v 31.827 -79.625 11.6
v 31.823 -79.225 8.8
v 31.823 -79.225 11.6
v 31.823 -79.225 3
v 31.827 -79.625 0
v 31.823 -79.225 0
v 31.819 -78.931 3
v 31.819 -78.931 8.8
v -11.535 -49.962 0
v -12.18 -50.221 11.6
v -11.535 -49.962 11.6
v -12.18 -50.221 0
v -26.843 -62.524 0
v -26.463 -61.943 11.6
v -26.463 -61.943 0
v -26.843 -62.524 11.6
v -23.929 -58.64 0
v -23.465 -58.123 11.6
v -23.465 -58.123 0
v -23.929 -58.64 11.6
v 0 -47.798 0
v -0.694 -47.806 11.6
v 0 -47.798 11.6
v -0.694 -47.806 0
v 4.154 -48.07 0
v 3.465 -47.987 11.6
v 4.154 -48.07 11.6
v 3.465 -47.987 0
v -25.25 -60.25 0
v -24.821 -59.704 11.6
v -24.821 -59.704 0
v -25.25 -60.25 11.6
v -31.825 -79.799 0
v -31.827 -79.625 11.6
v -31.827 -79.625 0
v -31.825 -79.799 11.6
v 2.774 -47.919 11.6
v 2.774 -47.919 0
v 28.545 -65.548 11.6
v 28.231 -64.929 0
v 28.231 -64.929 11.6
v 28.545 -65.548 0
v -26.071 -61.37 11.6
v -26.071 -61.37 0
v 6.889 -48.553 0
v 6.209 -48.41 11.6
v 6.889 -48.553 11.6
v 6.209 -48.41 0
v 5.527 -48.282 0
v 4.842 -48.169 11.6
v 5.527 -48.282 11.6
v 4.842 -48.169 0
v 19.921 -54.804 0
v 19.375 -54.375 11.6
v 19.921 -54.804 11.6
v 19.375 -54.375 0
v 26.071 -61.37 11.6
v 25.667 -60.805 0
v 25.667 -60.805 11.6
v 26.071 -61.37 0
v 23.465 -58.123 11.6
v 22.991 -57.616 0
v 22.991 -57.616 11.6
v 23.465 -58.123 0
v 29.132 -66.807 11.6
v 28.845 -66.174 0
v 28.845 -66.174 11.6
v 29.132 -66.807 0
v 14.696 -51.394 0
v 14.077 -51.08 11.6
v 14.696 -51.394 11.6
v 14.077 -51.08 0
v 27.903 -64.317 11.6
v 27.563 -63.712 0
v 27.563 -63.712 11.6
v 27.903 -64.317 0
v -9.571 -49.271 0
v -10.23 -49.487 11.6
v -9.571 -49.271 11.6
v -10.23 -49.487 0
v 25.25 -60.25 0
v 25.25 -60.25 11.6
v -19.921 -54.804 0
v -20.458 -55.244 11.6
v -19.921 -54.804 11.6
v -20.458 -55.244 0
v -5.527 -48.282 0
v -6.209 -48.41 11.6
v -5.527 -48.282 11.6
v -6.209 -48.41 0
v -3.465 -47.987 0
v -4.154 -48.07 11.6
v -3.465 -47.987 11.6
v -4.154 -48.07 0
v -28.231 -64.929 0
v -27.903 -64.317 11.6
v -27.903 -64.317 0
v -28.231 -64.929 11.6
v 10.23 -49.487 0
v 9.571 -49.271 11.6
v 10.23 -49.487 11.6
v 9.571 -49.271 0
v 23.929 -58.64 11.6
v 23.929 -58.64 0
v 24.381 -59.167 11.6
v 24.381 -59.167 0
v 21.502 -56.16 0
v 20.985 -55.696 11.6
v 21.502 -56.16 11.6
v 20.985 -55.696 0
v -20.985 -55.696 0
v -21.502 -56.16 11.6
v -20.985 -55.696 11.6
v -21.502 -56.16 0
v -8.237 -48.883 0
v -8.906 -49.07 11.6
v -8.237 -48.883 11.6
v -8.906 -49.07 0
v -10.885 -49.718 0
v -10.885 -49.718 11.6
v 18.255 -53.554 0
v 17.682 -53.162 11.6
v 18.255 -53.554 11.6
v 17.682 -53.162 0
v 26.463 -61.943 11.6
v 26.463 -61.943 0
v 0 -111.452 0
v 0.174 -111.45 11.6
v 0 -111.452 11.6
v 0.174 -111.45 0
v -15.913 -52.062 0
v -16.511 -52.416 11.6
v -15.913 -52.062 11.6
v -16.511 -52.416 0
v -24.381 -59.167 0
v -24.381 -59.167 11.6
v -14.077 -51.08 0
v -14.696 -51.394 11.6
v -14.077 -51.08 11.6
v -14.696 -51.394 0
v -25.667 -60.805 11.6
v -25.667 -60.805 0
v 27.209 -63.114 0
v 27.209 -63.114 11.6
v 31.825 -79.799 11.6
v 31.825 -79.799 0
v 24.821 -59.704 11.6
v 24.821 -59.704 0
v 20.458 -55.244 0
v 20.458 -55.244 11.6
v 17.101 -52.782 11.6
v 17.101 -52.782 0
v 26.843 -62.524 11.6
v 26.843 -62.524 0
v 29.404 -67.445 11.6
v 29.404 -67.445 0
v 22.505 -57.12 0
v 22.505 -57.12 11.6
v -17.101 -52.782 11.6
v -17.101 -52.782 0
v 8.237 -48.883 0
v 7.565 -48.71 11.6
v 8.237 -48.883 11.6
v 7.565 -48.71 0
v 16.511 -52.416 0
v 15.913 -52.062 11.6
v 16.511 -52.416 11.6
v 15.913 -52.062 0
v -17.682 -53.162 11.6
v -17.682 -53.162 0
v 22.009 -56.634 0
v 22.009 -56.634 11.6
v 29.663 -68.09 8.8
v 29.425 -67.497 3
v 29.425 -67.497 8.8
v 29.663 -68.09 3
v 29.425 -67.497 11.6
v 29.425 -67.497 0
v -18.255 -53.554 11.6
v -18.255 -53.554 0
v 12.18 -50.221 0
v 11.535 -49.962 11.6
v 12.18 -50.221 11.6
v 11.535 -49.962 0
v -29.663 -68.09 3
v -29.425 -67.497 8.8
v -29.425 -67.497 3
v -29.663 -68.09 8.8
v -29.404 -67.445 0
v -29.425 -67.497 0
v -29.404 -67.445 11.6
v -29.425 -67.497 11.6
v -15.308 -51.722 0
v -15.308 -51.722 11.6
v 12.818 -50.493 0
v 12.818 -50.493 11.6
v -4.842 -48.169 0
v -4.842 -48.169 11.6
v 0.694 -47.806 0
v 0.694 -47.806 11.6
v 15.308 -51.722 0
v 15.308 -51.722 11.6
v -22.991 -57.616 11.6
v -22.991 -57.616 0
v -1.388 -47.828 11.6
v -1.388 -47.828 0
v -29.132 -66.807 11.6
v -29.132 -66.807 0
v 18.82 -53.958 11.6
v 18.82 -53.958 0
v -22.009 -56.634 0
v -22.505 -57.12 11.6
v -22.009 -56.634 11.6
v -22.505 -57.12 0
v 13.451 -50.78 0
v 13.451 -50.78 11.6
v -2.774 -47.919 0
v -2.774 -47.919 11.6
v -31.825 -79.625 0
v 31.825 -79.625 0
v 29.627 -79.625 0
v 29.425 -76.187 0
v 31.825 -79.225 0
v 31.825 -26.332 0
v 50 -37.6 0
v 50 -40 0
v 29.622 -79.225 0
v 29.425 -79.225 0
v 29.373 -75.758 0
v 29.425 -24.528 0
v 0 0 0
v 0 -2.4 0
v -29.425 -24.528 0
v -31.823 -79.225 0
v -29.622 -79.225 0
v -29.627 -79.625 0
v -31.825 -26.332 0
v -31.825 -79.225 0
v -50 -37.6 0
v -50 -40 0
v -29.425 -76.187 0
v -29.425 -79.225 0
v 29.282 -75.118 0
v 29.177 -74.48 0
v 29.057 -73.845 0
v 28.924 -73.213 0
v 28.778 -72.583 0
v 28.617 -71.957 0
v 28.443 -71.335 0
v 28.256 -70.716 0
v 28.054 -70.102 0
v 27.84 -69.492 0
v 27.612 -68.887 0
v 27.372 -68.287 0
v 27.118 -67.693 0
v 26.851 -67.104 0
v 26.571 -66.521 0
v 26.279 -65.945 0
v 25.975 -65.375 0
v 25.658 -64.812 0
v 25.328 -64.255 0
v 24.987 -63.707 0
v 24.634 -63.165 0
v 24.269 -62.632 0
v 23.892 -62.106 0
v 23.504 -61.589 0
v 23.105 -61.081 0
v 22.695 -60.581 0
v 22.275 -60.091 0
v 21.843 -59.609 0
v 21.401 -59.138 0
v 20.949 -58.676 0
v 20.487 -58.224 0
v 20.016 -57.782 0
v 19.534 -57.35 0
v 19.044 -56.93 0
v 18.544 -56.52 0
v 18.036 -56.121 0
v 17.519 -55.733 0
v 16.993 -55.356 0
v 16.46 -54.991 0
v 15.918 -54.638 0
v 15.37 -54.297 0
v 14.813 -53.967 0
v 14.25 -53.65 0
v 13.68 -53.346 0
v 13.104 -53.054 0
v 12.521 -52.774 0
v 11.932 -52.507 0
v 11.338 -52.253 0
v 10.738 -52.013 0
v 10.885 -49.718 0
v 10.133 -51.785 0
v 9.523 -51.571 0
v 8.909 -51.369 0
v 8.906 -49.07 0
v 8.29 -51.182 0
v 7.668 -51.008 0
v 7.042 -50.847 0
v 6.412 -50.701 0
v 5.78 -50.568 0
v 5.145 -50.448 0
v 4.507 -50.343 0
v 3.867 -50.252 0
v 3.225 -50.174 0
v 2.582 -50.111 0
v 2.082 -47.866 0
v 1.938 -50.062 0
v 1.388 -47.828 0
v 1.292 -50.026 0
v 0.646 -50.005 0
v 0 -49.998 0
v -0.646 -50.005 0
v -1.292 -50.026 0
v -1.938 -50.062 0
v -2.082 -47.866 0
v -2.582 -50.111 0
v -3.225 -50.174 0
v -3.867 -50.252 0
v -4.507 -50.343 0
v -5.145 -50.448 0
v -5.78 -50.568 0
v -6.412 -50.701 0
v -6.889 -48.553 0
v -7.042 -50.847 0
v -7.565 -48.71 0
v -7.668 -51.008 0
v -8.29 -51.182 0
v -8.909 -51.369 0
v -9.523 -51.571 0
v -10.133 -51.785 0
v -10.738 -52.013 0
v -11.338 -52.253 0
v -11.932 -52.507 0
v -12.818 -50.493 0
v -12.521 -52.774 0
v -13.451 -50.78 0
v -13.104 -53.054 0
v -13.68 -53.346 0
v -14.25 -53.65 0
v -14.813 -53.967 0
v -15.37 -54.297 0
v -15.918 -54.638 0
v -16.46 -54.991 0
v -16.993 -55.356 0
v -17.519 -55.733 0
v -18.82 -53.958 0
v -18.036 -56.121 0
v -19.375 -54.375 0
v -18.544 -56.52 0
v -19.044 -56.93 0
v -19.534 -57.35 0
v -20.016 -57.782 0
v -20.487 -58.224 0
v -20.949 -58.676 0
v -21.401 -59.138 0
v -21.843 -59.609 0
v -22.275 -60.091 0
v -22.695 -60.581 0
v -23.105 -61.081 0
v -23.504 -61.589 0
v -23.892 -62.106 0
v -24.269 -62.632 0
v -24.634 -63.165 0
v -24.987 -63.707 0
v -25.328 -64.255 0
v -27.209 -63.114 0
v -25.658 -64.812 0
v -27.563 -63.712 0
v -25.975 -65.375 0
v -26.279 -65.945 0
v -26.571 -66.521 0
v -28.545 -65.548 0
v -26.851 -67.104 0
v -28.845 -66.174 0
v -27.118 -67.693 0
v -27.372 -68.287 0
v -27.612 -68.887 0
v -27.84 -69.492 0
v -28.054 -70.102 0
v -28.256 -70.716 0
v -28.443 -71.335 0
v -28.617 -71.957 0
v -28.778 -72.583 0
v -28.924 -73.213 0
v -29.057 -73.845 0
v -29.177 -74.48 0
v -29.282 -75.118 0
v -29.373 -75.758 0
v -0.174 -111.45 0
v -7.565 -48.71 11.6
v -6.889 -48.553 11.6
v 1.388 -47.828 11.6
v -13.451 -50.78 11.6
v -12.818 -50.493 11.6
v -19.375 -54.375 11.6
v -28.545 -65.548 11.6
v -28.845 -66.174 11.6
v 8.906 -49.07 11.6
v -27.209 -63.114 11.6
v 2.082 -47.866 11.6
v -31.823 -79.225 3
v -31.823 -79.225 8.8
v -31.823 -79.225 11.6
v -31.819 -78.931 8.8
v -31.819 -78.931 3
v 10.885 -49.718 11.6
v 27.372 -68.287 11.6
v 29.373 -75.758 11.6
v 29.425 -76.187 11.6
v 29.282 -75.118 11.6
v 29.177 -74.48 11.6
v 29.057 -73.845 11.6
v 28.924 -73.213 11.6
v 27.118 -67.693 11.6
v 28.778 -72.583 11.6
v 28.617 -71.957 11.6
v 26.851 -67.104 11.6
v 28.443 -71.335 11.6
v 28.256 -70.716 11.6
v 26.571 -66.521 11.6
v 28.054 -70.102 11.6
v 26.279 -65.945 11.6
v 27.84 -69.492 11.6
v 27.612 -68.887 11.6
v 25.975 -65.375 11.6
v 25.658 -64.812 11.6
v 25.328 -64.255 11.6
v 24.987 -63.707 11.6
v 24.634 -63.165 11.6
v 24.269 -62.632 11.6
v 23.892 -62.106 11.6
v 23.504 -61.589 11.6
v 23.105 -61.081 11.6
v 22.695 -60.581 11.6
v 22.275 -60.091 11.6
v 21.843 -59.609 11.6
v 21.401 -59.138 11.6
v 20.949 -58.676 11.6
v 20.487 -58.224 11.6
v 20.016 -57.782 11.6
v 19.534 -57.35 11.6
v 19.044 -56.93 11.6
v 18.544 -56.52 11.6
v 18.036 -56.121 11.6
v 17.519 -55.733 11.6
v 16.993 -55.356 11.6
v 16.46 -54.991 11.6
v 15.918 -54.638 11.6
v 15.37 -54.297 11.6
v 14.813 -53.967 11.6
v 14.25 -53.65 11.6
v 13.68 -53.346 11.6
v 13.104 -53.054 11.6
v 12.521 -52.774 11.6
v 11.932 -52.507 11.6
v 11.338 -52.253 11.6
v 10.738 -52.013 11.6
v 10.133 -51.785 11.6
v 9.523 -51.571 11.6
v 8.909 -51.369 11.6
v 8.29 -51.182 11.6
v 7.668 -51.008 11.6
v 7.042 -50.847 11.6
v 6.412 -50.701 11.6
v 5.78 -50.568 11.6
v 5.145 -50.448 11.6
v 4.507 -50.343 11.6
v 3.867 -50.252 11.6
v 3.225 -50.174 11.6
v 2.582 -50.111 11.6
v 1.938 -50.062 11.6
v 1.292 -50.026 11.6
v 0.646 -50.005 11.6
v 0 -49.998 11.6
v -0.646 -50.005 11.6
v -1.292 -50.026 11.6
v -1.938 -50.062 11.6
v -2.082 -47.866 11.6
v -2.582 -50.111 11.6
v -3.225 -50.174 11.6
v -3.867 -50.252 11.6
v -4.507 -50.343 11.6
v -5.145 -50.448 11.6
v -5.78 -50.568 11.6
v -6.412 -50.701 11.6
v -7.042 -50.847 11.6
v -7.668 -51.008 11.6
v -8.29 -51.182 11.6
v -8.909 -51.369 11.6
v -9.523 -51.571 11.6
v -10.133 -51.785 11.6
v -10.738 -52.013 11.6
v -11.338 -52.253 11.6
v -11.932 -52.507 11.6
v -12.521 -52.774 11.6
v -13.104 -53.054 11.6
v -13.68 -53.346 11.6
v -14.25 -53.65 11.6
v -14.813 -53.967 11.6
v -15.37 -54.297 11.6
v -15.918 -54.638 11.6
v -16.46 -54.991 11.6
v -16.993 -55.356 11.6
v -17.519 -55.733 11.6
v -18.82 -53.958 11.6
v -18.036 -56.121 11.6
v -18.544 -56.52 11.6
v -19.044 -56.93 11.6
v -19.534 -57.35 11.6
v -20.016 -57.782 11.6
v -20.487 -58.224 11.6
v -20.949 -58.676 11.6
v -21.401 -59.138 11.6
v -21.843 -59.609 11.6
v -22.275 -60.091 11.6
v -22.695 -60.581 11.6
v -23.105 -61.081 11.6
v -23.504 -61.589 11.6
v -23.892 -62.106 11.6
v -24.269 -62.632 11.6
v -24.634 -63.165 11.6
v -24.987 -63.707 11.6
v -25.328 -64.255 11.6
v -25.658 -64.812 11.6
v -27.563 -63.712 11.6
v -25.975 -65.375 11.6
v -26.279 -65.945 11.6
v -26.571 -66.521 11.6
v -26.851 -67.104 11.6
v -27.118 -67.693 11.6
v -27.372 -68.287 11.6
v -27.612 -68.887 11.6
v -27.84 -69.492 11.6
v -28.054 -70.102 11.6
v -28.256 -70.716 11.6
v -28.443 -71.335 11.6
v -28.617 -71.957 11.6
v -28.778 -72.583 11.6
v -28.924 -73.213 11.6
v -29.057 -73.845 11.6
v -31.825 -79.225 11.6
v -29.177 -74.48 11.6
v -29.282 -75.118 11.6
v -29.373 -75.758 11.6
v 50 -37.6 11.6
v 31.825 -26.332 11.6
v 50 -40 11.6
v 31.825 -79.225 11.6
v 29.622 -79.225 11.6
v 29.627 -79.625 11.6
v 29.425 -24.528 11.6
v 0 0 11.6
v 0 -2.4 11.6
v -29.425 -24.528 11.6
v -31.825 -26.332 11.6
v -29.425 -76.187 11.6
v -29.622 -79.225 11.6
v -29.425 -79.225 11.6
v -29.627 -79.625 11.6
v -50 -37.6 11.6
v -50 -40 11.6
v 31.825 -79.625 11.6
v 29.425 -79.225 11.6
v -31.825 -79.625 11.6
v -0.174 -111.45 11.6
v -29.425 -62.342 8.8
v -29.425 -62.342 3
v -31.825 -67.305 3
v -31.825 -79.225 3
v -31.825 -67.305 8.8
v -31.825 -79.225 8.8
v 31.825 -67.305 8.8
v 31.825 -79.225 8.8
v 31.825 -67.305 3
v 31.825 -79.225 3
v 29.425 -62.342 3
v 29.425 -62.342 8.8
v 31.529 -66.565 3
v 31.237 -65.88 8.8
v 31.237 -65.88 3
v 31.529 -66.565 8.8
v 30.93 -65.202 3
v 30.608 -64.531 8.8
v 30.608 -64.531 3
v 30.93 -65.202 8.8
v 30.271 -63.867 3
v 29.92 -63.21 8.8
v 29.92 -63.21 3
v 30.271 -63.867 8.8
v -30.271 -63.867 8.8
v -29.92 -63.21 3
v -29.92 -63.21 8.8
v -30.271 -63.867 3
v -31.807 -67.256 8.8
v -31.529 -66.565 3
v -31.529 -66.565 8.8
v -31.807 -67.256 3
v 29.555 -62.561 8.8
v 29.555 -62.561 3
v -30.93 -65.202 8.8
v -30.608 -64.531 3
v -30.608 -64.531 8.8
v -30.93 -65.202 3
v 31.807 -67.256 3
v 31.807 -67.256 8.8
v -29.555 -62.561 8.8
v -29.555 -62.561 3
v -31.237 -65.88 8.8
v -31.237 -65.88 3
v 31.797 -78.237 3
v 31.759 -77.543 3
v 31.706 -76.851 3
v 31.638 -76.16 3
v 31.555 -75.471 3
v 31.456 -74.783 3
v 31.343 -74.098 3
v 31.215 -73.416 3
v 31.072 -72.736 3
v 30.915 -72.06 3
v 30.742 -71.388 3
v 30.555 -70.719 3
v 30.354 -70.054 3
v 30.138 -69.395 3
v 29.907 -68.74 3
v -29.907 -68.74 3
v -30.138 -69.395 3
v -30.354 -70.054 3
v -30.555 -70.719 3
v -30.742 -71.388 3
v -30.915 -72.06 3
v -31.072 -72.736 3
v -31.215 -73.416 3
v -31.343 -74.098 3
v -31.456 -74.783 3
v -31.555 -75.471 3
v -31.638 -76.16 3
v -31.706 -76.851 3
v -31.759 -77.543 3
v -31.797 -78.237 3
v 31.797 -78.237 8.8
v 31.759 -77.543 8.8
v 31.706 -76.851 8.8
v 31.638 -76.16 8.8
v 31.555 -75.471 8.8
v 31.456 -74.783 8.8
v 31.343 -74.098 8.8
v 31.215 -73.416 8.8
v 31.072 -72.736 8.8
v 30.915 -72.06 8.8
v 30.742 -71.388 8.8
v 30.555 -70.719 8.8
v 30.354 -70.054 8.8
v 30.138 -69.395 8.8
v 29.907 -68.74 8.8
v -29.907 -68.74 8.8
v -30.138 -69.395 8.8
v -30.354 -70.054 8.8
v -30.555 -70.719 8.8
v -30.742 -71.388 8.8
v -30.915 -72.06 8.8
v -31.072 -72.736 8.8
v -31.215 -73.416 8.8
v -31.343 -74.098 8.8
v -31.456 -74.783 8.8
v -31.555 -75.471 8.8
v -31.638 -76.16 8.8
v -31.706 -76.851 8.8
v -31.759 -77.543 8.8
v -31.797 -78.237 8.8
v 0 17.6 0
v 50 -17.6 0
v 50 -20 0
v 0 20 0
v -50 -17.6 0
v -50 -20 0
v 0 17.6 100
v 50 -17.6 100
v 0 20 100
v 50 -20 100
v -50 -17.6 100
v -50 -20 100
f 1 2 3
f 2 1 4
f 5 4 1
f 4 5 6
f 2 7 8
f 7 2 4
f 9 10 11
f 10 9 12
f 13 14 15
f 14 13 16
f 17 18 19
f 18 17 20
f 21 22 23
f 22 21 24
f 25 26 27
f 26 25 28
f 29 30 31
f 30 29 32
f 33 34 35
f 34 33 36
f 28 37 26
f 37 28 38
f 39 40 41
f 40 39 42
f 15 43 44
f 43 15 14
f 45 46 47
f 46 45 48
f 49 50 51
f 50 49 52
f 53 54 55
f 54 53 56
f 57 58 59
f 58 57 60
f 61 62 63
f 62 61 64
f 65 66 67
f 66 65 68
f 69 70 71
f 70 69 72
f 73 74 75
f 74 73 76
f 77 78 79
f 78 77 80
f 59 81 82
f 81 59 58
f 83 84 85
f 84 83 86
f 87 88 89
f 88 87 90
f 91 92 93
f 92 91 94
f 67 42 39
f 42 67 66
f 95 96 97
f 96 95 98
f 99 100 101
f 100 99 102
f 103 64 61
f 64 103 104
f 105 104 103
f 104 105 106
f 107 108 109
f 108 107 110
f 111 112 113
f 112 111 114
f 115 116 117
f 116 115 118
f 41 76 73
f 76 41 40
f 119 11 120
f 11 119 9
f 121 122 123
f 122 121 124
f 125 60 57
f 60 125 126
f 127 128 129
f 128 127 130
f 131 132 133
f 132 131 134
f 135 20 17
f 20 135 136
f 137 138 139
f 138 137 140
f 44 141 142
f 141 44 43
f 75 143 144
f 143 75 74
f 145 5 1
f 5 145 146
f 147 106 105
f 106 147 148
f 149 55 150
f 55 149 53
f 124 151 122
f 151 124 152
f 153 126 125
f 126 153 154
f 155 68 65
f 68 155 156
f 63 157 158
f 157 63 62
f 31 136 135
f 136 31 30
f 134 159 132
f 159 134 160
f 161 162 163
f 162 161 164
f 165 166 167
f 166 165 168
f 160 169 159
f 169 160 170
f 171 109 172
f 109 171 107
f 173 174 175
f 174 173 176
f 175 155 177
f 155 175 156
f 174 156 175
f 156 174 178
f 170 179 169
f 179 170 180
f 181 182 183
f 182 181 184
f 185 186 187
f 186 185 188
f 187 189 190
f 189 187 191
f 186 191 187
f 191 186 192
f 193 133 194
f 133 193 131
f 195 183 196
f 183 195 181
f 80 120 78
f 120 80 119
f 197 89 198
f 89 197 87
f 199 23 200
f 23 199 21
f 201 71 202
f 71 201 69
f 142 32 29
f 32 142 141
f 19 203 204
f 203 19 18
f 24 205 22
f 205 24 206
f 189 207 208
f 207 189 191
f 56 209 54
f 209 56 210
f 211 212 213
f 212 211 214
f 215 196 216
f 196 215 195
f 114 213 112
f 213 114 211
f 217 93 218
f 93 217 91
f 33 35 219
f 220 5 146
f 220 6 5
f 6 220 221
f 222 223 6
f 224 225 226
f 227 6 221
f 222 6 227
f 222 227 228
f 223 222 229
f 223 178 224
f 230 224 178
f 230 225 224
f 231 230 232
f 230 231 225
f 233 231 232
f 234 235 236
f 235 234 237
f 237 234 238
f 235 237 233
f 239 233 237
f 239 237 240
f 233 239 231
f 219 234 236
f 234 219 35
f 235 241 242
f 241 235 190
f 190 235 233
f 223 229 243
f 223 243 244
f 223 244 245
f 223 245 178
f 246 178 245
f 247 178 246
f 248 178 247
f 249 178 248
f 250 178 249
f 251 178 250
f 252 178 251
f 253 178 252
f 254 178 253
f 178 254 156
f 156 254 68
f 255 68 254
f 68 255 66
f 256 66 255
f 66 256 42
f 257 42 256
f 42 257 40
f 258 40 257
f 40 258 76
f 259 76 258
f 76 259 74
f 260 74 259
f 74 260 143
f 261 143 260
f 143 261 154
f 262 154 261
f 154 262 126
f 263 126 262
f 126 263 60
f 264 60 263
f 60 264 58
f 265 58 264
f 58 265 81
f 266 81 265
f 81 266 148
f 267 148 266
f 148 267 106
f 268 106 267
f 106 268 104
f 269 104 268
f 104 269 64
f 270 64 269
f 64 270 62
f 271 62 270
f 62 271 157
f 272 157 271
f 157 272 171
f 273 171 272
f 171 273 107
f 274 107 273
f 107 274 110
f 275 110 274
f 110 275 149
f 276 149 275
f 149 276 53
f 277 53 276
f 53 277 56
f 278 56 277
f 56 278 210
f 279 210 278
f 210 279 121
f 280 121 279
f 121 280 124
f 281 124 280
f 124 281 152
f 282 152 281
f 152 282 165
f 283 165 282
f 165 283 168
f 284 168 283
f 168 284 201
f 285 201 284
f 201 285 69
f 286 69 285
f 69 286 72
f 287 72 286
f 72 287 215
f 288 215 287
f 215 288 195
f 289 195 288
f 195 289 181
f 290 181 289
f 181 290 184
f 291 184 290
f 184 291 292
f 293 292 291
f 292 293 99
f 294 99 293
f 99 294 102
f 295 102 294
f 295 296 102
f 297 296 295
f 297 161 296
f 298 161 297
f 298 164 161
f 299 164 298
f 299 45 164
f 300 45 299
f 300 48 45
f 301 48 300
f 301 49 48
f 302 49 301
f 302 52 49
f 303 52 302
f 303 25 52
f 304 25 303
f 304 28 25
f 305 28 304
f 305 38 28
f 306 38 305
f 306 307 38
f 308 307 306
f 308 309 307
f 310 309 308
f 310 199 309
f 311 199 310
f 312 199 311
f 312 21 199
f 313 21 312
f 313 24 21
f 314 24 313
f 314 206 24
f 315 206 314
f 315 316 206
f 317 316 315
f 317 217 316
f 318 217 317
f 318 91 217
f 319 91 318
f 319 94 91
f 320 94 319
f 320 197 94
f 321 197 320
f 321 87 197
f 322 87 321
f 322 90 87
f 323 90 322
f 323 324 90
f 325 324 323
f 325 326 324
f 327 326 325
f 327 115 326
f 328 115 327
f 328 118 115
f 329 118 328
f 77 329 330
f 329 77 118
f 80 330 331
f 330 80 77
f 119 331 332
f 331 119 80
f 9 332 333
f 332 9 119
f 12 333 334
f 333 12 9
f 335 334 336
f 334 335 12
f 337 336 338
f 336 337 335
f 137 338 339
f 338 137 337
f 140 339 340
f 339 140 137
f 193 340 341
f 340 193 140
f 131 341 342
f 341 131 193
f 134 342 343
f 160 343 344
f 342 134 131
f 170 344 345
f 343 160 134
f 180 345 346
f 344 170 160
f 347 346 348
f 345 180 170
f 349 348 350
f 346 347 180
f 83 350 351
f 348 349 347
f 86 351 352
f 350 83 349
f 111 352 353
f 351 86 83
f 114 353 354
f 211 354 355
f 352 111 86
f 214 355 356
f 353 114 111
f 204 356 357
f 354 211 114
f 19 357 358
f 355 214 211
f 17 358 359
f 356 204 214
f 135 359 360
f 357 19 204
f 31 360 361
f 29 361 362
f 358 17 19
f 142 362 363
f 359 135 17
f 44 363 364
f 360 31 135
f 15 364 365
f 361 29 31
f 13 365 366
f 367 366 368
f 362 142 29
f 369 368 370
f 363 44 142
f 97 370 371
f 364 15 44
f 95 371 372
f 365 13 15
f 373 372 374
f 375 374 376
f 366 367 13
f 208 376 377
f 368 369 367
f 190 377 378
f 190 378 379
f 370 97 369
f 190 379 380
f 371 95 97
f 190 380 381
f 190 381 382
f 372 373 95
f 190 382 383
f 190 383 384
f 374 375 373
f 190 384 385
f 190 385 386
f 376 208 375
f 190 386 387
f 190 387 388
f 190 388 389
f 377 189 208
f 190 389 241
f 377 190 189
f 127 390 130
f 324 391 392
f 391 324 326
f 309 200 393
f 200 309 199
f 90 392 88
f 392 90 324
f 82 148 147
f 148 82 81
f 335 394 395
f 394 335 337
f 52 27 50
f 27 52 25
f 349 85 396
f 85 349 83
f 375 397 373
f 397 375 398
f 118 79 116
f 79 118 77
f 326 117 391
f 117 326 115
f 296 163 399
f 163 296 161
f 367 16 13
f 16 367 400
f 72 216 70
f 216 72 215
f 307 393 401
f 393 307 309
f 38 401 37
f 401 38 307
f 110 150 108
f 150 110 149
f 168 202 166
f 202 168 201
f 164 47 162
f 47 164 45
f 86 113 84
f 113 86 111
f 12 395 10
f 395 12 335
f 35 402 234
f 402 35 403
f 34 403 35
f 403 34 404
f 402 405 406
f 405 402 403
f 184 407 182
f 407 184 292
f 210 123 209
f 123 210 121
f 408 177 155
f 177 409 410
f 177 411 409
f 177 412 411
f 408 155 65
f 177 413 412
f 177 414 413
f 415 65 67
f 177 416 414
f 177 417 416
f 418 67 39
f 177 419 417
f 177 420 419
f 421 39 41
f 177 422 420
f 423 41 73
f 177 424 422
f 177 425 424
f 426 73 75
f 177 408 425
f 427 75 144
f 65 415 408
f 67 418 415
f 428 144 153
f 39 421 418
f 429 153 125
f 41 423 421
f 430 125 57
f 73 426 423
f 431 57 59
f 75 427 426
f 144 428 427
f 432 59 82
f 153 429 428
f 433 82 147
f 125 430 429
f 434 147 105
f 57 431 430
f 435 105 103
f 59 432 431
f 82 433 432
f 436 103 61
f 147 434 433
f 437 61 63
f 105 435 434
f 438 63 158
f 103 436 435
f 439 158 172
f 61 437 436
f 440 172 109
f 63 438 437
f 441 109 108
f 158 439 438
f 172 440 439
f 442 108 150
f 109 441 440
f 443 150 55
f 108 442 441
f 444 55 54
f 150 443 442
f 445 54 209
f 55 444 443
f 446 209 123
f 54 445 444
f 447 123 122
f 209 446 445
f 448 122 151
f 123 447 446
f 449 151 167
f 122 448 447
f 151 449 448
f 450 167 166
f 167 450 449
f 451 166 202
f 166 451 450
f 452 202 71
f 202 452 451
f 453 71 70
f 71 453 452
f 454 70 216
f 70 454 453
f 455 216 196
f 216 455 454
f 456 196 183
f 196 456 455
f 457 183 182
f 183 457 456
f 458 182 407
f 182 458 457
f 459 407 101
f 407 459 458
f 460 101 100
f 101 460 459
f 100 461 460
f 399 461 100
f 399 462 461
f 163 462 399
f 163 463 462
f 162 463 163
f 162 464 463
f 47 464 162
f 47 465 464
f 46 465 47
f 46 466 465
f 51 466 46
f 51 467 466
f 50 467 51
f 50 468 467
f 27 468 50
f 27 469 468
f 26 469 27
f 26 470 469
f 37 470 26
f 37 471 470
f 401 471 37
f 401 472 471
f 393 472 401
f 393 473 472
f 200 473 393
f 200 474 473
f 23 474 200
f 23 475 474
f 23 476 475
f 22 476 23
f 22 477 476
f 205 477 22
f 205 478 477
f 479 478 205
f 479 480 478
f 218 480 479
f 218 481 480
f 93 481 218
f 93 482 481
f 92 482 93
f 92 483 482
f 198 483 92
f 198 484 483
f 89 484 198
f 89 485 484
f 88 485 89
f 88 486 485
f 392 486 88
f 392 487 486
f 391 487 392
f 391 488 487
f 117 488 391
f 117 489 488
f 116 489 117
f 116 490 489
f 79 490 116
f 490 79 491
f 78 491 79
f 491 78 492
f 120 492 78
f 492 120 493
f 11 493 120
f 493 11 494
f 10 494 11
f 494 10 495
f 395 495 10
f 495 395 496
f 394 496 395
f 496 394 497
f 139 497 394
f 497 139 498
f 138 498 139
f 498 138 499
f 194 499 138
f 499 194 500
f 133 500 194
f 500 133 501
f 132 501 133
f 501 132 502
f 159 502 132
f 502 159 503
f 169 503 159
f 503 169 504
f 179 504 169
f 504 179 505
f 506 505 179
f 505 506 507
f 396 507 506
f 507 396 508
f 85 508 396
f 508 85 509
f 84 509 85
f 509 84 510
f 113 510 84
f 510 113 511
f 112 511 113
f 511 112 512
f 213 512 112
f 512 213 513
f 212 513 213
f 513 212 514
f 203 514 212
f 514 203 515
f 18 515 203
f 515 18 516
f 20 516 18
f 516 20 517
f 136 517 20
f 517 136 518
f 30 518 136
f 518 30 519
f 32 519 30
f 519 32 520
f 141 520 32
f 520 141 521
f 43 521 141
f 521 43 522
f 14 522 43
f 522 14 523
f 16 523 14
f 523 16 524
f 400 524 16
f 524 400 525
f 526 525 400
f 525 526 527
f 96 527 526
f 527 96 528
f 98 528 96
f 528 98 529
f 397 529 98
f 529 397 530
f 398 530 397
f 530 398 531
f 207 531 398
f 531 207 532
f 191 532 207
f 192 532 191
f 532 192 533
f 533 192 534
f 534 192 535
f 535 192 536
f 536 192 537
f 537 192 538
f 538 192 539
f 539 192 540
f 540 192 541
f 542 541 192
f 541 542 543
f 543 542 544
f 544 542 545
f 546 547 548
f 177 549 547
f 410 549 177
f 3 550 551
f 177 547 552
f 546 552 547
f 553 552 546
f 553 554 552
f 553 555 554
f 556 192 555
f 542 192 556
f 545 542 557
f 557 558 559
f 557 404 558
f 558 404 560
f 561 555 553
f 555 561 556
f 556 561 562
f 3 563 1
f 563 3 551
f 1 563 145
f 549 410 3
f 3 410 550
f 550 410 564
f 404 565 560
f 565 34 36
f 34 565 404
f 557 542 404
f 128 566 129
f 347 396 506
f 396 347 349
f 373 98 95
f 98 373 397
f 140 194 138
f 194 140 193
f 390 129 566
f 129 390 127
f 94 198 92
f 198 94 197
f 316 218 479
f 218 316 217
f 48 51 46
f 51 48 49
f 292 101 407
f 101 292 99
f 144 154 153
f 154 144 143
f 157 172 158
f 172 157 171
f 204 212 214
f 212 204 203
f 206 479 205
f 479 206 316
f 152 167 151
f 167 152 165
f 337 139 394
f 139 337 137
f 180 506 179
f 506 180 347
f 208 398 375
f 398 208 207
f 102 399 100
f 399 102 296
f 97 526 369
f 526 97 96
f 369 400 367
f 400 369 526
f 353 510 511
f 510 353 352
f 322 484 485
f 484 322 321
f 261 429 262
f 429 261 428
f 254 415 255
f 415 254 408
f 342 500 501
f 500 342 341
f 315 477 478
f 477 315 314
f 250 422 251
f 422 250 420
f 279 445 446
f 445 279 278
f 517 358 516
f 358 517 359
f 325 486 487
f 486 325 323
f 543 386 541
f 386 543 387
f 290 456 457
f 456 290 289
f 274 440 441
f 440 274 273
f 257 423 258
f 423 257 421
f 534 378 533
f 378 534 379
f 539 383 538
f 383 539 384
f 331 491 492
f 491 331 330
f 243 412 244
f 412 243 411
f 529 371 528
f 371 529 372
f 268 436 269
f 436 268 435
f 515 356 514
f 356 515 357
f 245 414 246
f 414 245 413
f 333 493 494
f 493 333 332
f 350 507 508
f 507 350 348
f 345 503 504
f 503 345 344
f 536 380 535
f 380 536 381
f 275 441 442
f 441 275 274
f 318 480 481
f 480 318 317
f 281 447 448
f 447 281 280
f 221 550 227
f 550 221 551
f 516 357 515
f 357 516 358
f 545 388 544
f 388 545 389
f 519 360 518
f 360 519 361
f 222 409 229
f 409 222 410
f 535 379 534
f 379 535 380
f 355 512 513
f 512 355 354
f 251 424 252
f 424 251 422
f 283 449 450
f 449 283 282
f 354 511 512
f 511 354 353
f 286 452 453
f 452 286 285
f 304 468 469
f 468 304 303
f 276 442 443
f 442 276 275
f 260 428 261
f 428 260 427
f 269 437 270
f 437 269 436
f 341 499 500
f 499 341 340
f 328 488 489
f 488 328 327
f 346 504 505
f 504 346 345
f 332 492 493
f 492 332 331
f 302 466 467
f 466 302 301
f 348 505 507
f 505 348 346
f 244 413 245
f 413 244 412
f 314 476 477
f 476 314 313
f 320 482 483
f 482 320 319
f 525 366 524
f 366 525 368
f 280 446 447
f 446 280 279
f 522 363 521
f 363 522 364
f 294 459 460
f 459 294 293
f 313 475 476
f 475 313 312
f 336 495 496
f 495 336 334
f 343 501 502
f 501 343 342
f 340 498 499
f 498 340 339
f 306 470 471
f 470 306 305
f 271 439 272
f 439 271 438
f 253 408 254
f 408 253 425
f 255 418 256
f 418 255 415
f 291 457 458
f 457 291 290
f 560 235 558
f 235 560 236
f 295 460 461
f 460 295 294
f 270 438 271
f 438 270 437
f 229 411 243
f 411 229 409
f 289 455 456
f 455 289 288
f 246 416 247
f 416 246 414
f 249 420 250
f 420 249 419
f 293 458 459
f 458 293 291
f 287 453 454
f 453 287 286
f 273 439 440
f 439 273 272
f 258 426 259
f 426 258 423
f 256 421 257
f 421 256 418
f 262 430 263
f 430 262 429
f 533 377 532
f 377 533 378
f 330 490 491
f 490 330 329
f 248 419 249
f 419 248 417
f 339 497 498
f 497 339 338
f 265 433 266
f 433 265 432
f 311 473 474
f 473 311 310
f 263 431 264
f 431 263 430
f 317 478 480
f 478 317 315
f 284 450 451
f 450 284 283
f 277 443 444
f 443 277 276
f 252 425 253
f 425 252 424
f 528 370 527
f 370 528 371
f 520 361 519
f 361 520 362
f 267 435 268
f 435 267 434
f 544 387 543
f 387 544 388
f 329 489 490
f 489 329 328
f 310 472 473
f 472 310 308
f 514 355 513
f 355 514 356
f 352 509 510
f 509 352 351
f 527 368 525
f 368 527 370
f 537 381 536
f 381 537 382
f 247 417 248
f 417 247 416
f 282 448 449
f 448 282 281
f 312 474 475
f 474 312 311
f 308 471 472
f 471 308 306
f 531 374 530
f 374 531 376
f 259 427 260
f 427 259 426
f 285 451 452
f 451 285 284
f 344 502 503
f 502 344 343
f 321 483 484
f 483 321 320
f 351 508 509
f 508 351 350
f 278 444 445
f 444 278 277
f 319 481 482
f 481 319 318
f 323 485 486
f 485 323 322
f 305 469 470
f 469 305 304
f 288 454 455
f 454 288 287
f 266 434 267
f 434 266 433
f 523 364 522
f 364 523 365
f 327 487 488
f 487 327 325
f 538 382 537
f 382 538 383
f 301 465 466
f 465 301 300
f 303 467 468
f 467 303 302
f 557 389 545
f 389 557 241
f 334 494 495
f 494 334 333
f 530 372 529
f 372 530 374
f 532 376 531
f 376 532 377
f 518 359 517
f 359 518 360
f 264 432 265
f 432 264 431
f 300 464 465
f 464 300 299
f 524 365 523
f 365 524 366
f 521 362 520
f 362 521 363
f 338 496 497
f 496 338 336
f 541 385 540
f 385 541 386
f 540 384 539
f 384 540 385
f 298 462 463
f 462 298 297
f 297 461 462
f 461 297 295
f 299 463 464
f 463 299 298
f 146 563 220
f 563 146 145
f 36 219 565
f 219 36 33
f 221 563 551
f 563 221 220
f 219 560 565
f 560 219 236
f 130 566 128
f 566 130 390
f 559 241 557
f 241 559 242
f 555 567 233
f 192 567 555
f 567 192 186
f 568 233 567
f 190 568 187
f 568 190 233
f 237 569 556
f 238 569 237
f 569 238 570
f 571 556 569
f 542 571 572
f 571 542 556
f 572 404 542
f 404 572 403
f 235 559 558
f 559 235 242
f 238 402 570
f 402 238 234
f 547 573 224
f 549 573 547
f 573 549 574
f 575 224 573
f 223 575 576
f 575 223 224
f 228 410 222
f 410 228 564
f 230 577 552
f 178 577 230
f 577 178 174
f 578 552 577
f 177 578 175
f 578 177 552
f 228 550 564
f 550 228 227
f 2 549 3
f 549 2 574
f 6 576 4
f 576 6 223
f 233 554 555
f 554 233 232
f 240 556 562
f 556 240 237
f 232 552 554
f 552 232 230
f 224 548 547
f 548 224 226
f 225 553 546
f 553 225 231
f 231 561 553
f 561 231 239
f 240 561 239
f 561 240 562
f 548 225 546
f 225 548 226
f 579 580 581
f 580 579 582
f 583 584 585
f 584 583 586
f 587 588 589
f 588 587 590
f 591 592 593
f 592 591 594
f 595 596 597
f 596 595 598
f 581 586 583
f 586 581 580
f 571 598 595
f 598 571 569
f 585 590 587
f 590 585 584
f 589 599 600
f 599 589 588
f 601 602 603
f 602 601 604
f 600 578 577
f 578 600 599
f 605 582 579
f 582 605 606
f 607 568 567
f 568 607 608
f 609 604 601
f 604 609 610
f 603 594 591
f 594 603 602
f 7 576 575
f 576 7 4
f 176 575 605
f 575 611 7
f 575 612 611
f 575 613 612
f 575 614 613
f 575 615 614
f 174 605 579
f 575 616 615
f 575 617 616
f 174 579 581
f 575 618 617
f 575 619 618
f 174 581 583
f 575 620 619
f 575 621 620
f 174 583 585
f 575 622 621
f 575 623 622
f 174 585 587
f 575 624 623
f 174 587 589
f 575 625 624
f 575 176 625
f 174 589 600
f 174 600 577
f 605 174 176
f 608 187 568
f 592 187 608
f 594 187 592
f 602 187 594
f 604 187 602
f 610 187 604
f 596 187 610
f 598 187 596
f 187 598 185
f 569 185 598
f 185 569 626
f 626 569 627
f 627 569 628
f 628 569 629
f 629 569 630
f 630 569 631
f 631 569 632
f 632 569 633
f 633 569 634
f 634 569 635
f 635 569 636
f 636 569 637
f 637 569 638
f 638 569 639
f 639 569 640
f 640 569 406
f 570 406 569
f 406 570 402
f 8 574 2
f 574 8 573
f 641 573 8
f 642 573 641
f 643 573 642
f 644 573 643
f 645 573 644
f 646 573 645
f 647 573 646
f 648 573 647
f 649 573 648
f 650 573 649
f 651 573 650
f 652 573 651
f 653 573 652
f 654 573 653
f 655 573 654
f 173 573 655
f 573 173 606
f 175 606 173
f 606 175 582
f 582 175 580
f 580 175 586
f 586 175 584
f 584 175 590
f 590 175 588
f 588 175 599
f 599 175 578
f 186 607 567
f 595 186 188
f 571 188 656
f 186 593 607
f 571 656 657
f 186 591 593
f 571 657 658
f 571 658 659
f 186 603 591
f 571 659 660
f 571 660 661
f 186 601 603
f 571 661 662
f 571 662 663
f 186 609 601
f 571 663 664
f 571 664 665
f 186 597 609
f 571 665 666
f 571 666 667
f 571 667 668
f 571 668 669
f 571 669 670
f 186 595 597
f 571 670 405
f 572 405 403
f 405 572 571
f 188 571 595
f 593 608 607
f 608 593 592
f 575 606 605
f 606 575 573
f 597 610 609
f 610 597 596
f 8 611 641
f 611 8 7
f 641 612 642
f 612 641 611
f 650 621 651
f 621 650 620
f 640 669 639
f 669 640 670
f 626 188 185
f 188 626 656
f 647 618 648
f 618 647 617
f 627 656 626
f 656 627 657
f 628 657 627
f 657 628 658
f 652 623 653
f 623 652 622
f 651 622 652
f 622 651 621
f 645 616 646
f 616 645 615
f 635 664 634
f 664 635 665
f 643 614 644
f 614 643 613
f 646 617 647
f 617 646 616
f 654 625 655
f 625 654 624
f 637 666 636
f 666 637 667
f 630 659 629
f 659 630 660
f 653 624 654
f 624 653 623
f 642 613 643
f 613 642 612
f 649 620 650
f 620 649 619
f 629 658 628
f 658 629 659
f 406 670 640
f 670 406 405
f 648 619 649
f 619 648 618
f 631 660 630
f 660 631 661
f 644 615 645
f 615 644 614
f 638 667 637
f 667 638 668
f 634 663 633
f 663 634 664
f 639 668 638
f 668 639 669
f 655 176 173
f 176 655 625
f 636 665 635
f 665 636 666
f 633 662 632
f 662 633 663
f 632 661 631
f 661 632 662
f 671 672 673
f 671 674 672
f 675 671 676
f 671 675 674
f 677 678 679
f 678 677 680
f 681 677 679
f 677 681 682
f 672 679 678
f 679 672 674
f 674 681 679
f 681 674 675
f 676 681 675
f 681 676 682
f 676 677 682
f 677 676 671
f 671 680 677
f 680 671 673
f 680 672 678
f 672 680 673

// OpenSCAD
fn=72*4;
$fn=fn;

module cylinder_outer(height,radius,fn=fn) {
   fudge = 1/cos(180/fn);
   cylinder(h=height,r=radius*fudge,$fn=fn);
}

module cone_outer(height,radius1,radius2,fn=fn) {
   fudge = 1/cos(180/fn);
   cylinder(h=height,r1=radius1*fudge,r2=radius2*fudge,$fn=fn);
}

pipe_od=58.45;
clearance_loose=0.4;
clearance_tight=0.2;
min_thickness=2.4;
de_minimus=0.1;

holder_half_x=(pipe_od / 2) + clearance_tight + min_thickness;

roof_width=max(100, holder_half_x * 2);
roof_rise=40;
roof_len=100;

// select 4.8mm 250mm zip ties
zip_tie_width=4.8 + 1;
zip_tie_thickness=1.8 + 0.5;

holder_z=zip_tie_width * 2;

module _pipeCylinder(holder_z, pipe_od, holder_half_x) {
    difference() {
        cylinder_outer(holder_z, holder_half_x);
        cylinder_outer(holder_z, (pipe_od / 2) + clearance_loose);
    }
}

module pipeHolder(pipe_top_distance) {
    holder_tran=[
        0,
        -(pipe_od / 2 + clearance_loose + pipe_top_distance),
        0,
    ];

    translate(holder_tran) {
        difference() {
            _pipeCylinder(holder_z, pipe_od, holder_half_x);
            half_cube_dim=[holder_half_x * 2,holder_half_x, holder_z];
            half_cube_tran=[-half_cube_dim.x / 2,-holder_half_x,0];
            translate(half_cube_tran) cube(half_cube_dim);
        }
    }
}

module posts(pipe_lower_apex_distance) {
    c_tran_1=[
        -(pipe_od / 2 + min_thickness + clearance_tight),
        -pipe_lower_apex_distance - pipe_od / 2,
        0
    ];
    translate(c_tran_1) cube([min_thickness, (pipe_lower_apex_distance + pipe_od), holder_z]);
    c_tran_2=[
        (pipe_od / 2 + clearance_tight),
        -pipe_lower_apex_distance - pipe_od / 2,
        0
    ];
    translate(c_tran_2) cube([min_thickness, (pipe_lower_apex_distance + pipe_od), holder_z]);
}

module Roof(mask=false, length=0) {
    d_y = mask ? 200 : min_thickness;
    under_pts_xy = [
        [0,-min_thickness],
        [roof_width/2, -roof_rise],
        [roof_width/2, -roof_rise + d_y],
        [0, 0],
        [-roof_width/2, -roof_rise + d_y],
        [-roof_width/2, -roof_rise],
    ];
    linear_extrude(length) polygon(points=under_pts_xy);
}

module zipTieLoop(pipe_top_distance) {
    zip_tie_tran=[
        0,
        -(pipe_od / 2 + clearance_loose + pipe_top_distance),
        (holder_z - (zip_tie_width - clearance_loose /2)) / 2
    ];
    translate(zip_tie_tran) difference() {
        cylinder_outer(zip_tie_width, holder_half_x + zip_tie_thickness);
        cylinder_outer(zip_tie_width, holder_half_x);
    }
}

module Frame(pipe_lower_apex_distance) {
    difference() {
        union() {
            pipeHolder(pipe_lower_apex_distance);

            difference() {
                posts(pipe_lower_apex_distance);
                Roof(mask=true, length=holder_z);
            }
            Roof(mask=false, length=holder_z);
        }
        zipTieLoop(pipe_lower_apex_distance);
    }
}

Frame(50);

translate([0, 20, 0]) Roof(mask=false, length=roof_len);
